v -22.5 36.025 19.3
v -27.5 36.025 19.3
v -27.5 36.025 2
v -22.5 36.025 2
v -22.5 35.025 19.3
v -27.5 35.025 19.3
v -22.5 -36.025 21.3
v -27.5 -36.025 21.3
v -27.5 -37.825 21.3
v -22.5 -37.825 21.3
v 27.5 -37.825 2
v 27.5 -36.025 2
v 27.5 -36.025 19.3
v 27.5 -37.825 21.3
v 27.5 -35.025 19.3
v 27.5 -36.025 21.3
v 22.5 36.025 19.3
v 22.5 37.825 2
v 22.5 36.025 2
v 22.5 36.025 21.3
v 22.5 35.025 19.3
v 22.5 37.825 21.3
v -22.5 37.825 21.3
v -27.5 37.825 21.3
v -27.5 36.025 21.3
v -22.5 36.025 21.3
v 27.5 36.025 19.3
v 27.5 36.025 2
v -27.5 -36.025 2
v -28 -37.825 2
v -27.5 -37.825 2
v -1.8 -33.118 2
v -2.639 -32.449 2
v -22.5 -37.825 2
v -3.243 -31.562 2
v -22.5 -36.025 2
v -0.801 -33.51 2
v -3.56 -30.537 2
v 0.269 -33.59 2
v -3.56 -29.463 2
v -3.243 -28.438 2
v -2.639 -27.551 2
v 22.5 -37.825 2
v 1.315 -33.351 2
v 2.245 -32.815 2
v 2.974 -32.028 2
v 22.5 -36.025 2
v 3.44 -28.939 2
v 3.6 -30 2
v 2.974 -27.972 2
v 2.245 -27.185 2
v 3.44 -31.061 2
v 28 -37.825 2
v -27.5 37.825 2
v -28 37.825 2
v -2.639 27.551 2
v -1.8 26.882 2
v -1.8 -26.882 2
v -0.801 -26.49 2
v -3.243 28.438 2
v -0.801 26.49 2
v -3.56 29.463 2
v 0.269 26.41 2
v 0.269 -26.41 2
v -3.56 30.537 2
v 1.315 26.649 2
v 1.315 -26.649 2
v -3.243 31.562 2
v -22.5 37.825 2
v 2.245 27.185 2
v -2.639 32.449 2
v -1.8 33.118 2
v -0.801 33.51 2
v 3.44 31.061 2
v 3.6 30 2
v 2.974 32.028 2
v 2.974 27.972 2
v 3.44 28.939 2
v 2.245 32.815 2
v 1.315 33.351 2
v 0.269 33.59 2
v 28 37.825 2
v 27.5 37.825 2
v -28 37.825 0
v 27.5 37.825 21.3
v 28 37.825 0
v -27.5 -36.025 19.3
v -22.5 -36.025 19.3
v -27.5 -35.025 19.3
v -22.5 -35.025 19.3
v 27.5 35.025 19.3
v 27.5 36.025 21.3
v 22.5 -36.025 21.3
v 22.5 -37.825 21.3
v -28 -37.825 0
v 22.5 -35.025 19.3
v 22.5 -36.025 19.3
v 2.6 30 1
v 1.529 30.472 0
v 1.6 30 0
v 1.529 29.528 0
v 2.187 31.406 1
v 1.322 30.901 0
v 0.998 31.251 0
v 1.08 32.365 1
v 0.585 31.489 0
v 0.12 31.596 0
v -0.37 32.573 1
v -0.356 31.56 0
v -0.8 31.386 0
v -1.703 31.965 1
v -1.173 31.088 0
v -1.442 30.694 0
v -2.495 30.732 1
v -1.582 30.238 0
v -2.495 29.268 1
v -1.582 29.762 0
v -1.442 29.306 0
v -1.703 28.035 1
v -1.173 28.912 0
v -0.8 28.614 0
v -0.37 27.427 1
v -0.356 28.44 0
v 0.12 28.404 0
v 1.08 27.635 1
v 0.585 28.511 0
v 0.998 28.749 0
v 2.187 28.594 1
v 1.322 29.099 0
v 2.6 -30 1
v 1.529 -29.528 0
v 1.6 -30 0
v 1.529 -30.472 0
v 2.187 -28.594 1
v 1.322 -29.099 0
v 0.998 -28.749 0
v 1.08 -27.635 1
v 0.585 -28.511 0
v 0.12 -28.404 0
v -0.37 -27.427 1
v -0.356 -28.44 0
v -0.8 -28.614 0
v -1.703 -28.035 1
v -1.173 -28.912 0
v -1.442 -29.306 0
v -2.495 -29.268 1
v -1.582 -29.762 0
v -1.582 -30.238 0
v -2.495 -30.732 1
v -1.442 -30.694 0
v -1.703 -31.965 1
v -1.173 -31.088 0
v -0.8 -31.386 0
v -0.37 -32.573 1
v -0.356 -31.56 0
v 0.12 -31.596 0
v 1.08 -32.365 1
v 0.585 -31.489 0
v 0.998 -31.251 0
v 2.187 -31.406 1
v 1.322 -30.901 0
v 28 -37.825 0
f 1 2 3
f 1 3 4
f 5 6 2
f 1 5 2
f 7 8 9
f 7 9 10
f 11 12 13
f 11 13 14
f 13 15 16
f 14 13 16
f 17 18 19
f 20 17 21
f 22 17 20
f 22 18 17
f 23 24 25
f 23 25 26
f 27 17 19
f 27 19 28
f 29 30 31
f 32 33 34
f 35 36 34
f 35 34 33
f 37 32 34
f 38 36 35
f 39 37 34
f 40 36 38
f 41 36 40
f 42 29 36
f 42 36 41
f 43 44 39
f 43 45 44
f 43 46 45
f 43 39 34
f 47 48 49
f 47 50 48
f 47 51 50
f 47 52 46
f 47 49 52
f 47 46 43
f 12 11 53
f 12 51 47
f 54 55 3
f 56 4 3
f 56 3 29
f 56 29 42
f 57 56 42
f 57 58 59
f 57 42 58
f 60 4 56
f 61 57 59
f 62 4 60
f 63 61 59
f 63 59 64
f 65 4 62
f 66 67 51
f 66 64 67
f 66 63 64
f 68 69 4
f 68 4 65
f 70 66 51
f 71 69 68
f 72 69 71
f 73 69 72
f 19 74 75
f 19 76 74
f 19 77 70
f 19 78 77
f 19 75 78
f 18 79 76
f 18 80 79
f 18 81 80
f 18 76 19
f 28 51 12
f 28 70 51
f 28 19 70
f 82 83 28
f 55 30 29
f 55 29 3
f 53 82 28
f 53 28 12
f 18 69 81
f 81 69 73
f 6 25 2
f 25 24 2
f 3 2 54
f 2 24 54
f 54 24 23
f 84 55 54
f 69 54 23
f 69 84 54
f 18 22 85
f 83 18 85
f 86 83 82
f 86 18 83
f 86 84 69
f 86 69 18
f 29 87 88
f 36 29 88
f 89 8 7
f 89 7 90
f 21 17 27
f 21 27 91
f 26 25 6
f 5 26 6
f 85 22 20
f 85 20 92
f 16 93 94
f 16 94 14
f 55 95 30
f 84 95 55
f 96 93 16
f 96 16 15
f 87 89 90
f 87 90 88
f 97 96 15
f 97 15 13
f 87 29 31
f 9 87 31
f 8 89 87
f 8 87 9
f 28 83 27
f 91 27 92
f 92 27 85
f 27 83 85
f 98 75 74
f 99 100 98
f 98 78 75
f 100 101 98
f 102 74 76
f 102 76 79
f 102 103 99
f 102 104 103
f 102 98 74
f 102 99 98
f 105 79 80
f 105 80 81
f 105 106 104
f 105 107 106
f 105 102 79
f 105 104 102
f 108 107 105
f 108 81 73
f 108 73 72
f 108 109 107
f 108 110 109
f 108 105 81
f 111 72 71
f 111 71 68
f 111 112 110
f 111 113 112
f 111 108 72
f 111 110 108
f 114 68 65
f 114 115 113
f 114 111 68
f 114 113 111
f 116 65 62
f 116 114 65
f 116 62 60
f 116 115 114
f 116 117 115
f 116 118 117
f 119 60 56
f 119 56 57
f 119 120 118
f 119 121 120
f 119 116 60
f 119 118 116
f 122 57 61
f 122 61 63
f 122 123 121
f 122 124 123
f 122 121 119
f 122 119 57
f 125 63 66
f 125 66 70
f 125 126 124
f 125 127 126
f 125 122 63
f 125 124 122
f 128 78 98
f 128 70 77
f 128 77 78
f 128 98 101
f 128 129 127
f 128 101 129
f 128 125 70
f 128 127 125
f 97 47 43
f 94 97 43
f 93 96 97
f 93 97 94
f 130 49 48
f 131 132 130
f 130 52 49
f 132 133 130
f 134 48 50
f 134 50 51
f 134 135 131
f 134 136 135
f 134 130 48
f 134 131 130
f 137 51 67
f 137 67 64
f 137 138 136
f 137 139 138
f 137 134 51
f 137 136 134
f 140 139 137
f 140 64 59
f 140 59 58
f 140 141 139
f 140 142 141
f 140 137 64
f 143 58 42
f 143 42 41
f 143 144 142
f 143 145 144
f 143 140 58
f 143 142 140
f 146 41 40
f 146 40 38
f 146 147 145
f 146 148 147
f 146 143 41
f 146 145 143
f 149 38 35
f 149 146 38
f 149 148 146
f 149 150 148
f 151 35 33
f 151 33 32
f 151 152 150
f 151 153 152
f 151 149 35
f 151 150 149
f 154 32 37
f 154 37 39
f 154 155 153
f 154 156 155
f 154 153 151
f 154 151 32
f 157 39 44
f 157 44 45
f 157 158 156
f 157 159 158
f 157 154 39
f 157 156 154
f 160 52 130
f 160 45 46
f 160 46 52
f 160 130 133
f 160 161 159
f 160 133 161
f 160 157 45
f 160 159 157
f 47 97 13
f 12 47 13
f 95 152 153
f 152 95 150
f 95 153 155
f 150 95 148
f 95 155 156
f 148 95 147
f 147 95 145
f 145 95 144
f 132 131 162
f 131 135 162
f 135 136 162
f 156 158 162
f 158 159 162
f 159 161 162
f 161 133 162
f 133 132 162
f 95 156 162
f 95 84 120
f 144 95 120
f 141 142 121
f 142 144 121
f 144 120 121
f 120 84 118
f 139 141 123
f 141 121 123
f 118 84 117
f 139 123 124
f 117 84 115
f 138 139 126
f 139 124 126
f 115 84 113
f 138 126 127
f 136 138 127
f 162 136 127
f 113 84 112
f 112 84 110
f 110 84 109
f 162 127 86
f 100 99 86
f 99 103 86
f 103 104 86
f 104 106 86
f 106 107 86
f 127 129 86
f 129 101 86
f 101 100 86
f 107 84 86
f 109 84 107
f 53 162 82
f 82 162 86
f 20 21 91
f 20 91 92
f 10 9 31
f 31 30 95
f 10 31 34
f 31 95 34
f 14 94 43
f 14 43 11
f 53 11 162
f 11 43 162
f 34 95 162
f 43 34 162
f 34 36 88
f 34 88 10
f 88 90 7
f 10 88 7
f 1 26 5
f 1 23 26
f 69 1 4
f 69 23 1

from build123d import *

# Parameters (mm, degrees)
SKETCH_1_W          = 56
SKETCH_1_H          = 75.65
EXTRUDE_1_DEPTH     = 2
SKETCH_2_W          = 5
SKETCH_2_H          = 1.8
EXTRUDE_2_DEPTH     = 19.3
EXTRUDE_3_DEPTH     = 5
EXTRUDE_4_DEPTH     = 5
EXTRUDE_5_DEPTH     = 5
EXTRUDE_6_DEPTH     = 5
SKETCH_7_R          = 1.6
CUT_EXTRUDE_1_DEPTH = 51.864728693
CHAMFER_1_SIZE      = 2


with BuildPart() as part:
    # 草图1 → 凸台-拉伸1 (new body)
    with BuildSketch(Plane.XY):
        Rectangle(SKETCH_1_W, SKETCH_1_H)
    extrude(amount=EXTRUDE_1_DEPTH)

    # 草图2 → 凸台-拉伸2 (add)
    with BuildSketch(Plane.XY.offset(2)):
        with Locations((-25, 36.925)):
            Rectangle(SKETCH_2_W, SKETCH_2_H)
        with Locations((25, 36.925)):
            Rectangle(SKETCH_2_W, SKETCH_2_H)
        with Locations((-25, -36.925)):
            Rectangle(SKETCH_2_W, SKETCH_2_H)
        with Locations((25, -36.925)):
            Rectangle(SKETCH_2_W, SKETCH_2_H)
    extrude(amount=EXTRUDE_2_DEPTH)

    # 草图3 → 凸台-拉伸3 (add)
    with BuildSketch(Plane.ZY.offset(27.5)):
        Polygon((21.3, 36.025), (19.3, 35.025), (19.3, 36.025), align=None)
    extrude(amount=-EXTRUDE_3_DEPTH)

    # 草图4 → 凸台-拉伸4 (add)
    with BuildSketch(Plane.ZY.offset(-22.5)):
        Polygon((19.3, 36.025), (19.3, 35.025), (21.3, 36.025), align=None)
    extrude(amount=-EXTRUDE_4_DEPTH)

    # 草图5 → 凸台-拉伸5 (add)
    with BuildSketch(Plane.ZY.offset(27.5)):
        Polygon((21.3, -36.025), (19.3, -35.025), (19.3, -36.025), align=None)
    extrude(amount=-EXTRUDE_5_DEPTH)

    # 草图6 → 凸台-拉伸6 (add)
    with BuildSketch(Plane.ZY.offset(-22.5)):
        Polygon((19.3, -36.025), (21.3, -36.025), (19.3, -35.025), align=None)
    extrude(amount=-EXTRUDE_6_DEPTH)

    # 草图7 → 切除-拉伸1 (cut, through all)
    with BuildSketch(Plane.XY.offset(2)):
        with Locations((0, 30)):
            Circle(SKETCH_7_R)
        with Locations((0, -30)):
            Circle(SKETCH_7_R)
    extrude(amount=-CUT_EXTRUDE_1_DEPTH, mode=Mode.SUBTRACT)

    # 倒角1
    chamfer_1_edges = [part.edges().sort_by_distance(p)[0] for p in [
        (-1.6, 30, 2),
        (-1.6, -30, 2),
    ]]
    chamfer(chamfer_1_edges, length=CHAMFER_1_SIZE - 0.0001)  # a hair under: the kernel refuses the full size


solid = part.part
